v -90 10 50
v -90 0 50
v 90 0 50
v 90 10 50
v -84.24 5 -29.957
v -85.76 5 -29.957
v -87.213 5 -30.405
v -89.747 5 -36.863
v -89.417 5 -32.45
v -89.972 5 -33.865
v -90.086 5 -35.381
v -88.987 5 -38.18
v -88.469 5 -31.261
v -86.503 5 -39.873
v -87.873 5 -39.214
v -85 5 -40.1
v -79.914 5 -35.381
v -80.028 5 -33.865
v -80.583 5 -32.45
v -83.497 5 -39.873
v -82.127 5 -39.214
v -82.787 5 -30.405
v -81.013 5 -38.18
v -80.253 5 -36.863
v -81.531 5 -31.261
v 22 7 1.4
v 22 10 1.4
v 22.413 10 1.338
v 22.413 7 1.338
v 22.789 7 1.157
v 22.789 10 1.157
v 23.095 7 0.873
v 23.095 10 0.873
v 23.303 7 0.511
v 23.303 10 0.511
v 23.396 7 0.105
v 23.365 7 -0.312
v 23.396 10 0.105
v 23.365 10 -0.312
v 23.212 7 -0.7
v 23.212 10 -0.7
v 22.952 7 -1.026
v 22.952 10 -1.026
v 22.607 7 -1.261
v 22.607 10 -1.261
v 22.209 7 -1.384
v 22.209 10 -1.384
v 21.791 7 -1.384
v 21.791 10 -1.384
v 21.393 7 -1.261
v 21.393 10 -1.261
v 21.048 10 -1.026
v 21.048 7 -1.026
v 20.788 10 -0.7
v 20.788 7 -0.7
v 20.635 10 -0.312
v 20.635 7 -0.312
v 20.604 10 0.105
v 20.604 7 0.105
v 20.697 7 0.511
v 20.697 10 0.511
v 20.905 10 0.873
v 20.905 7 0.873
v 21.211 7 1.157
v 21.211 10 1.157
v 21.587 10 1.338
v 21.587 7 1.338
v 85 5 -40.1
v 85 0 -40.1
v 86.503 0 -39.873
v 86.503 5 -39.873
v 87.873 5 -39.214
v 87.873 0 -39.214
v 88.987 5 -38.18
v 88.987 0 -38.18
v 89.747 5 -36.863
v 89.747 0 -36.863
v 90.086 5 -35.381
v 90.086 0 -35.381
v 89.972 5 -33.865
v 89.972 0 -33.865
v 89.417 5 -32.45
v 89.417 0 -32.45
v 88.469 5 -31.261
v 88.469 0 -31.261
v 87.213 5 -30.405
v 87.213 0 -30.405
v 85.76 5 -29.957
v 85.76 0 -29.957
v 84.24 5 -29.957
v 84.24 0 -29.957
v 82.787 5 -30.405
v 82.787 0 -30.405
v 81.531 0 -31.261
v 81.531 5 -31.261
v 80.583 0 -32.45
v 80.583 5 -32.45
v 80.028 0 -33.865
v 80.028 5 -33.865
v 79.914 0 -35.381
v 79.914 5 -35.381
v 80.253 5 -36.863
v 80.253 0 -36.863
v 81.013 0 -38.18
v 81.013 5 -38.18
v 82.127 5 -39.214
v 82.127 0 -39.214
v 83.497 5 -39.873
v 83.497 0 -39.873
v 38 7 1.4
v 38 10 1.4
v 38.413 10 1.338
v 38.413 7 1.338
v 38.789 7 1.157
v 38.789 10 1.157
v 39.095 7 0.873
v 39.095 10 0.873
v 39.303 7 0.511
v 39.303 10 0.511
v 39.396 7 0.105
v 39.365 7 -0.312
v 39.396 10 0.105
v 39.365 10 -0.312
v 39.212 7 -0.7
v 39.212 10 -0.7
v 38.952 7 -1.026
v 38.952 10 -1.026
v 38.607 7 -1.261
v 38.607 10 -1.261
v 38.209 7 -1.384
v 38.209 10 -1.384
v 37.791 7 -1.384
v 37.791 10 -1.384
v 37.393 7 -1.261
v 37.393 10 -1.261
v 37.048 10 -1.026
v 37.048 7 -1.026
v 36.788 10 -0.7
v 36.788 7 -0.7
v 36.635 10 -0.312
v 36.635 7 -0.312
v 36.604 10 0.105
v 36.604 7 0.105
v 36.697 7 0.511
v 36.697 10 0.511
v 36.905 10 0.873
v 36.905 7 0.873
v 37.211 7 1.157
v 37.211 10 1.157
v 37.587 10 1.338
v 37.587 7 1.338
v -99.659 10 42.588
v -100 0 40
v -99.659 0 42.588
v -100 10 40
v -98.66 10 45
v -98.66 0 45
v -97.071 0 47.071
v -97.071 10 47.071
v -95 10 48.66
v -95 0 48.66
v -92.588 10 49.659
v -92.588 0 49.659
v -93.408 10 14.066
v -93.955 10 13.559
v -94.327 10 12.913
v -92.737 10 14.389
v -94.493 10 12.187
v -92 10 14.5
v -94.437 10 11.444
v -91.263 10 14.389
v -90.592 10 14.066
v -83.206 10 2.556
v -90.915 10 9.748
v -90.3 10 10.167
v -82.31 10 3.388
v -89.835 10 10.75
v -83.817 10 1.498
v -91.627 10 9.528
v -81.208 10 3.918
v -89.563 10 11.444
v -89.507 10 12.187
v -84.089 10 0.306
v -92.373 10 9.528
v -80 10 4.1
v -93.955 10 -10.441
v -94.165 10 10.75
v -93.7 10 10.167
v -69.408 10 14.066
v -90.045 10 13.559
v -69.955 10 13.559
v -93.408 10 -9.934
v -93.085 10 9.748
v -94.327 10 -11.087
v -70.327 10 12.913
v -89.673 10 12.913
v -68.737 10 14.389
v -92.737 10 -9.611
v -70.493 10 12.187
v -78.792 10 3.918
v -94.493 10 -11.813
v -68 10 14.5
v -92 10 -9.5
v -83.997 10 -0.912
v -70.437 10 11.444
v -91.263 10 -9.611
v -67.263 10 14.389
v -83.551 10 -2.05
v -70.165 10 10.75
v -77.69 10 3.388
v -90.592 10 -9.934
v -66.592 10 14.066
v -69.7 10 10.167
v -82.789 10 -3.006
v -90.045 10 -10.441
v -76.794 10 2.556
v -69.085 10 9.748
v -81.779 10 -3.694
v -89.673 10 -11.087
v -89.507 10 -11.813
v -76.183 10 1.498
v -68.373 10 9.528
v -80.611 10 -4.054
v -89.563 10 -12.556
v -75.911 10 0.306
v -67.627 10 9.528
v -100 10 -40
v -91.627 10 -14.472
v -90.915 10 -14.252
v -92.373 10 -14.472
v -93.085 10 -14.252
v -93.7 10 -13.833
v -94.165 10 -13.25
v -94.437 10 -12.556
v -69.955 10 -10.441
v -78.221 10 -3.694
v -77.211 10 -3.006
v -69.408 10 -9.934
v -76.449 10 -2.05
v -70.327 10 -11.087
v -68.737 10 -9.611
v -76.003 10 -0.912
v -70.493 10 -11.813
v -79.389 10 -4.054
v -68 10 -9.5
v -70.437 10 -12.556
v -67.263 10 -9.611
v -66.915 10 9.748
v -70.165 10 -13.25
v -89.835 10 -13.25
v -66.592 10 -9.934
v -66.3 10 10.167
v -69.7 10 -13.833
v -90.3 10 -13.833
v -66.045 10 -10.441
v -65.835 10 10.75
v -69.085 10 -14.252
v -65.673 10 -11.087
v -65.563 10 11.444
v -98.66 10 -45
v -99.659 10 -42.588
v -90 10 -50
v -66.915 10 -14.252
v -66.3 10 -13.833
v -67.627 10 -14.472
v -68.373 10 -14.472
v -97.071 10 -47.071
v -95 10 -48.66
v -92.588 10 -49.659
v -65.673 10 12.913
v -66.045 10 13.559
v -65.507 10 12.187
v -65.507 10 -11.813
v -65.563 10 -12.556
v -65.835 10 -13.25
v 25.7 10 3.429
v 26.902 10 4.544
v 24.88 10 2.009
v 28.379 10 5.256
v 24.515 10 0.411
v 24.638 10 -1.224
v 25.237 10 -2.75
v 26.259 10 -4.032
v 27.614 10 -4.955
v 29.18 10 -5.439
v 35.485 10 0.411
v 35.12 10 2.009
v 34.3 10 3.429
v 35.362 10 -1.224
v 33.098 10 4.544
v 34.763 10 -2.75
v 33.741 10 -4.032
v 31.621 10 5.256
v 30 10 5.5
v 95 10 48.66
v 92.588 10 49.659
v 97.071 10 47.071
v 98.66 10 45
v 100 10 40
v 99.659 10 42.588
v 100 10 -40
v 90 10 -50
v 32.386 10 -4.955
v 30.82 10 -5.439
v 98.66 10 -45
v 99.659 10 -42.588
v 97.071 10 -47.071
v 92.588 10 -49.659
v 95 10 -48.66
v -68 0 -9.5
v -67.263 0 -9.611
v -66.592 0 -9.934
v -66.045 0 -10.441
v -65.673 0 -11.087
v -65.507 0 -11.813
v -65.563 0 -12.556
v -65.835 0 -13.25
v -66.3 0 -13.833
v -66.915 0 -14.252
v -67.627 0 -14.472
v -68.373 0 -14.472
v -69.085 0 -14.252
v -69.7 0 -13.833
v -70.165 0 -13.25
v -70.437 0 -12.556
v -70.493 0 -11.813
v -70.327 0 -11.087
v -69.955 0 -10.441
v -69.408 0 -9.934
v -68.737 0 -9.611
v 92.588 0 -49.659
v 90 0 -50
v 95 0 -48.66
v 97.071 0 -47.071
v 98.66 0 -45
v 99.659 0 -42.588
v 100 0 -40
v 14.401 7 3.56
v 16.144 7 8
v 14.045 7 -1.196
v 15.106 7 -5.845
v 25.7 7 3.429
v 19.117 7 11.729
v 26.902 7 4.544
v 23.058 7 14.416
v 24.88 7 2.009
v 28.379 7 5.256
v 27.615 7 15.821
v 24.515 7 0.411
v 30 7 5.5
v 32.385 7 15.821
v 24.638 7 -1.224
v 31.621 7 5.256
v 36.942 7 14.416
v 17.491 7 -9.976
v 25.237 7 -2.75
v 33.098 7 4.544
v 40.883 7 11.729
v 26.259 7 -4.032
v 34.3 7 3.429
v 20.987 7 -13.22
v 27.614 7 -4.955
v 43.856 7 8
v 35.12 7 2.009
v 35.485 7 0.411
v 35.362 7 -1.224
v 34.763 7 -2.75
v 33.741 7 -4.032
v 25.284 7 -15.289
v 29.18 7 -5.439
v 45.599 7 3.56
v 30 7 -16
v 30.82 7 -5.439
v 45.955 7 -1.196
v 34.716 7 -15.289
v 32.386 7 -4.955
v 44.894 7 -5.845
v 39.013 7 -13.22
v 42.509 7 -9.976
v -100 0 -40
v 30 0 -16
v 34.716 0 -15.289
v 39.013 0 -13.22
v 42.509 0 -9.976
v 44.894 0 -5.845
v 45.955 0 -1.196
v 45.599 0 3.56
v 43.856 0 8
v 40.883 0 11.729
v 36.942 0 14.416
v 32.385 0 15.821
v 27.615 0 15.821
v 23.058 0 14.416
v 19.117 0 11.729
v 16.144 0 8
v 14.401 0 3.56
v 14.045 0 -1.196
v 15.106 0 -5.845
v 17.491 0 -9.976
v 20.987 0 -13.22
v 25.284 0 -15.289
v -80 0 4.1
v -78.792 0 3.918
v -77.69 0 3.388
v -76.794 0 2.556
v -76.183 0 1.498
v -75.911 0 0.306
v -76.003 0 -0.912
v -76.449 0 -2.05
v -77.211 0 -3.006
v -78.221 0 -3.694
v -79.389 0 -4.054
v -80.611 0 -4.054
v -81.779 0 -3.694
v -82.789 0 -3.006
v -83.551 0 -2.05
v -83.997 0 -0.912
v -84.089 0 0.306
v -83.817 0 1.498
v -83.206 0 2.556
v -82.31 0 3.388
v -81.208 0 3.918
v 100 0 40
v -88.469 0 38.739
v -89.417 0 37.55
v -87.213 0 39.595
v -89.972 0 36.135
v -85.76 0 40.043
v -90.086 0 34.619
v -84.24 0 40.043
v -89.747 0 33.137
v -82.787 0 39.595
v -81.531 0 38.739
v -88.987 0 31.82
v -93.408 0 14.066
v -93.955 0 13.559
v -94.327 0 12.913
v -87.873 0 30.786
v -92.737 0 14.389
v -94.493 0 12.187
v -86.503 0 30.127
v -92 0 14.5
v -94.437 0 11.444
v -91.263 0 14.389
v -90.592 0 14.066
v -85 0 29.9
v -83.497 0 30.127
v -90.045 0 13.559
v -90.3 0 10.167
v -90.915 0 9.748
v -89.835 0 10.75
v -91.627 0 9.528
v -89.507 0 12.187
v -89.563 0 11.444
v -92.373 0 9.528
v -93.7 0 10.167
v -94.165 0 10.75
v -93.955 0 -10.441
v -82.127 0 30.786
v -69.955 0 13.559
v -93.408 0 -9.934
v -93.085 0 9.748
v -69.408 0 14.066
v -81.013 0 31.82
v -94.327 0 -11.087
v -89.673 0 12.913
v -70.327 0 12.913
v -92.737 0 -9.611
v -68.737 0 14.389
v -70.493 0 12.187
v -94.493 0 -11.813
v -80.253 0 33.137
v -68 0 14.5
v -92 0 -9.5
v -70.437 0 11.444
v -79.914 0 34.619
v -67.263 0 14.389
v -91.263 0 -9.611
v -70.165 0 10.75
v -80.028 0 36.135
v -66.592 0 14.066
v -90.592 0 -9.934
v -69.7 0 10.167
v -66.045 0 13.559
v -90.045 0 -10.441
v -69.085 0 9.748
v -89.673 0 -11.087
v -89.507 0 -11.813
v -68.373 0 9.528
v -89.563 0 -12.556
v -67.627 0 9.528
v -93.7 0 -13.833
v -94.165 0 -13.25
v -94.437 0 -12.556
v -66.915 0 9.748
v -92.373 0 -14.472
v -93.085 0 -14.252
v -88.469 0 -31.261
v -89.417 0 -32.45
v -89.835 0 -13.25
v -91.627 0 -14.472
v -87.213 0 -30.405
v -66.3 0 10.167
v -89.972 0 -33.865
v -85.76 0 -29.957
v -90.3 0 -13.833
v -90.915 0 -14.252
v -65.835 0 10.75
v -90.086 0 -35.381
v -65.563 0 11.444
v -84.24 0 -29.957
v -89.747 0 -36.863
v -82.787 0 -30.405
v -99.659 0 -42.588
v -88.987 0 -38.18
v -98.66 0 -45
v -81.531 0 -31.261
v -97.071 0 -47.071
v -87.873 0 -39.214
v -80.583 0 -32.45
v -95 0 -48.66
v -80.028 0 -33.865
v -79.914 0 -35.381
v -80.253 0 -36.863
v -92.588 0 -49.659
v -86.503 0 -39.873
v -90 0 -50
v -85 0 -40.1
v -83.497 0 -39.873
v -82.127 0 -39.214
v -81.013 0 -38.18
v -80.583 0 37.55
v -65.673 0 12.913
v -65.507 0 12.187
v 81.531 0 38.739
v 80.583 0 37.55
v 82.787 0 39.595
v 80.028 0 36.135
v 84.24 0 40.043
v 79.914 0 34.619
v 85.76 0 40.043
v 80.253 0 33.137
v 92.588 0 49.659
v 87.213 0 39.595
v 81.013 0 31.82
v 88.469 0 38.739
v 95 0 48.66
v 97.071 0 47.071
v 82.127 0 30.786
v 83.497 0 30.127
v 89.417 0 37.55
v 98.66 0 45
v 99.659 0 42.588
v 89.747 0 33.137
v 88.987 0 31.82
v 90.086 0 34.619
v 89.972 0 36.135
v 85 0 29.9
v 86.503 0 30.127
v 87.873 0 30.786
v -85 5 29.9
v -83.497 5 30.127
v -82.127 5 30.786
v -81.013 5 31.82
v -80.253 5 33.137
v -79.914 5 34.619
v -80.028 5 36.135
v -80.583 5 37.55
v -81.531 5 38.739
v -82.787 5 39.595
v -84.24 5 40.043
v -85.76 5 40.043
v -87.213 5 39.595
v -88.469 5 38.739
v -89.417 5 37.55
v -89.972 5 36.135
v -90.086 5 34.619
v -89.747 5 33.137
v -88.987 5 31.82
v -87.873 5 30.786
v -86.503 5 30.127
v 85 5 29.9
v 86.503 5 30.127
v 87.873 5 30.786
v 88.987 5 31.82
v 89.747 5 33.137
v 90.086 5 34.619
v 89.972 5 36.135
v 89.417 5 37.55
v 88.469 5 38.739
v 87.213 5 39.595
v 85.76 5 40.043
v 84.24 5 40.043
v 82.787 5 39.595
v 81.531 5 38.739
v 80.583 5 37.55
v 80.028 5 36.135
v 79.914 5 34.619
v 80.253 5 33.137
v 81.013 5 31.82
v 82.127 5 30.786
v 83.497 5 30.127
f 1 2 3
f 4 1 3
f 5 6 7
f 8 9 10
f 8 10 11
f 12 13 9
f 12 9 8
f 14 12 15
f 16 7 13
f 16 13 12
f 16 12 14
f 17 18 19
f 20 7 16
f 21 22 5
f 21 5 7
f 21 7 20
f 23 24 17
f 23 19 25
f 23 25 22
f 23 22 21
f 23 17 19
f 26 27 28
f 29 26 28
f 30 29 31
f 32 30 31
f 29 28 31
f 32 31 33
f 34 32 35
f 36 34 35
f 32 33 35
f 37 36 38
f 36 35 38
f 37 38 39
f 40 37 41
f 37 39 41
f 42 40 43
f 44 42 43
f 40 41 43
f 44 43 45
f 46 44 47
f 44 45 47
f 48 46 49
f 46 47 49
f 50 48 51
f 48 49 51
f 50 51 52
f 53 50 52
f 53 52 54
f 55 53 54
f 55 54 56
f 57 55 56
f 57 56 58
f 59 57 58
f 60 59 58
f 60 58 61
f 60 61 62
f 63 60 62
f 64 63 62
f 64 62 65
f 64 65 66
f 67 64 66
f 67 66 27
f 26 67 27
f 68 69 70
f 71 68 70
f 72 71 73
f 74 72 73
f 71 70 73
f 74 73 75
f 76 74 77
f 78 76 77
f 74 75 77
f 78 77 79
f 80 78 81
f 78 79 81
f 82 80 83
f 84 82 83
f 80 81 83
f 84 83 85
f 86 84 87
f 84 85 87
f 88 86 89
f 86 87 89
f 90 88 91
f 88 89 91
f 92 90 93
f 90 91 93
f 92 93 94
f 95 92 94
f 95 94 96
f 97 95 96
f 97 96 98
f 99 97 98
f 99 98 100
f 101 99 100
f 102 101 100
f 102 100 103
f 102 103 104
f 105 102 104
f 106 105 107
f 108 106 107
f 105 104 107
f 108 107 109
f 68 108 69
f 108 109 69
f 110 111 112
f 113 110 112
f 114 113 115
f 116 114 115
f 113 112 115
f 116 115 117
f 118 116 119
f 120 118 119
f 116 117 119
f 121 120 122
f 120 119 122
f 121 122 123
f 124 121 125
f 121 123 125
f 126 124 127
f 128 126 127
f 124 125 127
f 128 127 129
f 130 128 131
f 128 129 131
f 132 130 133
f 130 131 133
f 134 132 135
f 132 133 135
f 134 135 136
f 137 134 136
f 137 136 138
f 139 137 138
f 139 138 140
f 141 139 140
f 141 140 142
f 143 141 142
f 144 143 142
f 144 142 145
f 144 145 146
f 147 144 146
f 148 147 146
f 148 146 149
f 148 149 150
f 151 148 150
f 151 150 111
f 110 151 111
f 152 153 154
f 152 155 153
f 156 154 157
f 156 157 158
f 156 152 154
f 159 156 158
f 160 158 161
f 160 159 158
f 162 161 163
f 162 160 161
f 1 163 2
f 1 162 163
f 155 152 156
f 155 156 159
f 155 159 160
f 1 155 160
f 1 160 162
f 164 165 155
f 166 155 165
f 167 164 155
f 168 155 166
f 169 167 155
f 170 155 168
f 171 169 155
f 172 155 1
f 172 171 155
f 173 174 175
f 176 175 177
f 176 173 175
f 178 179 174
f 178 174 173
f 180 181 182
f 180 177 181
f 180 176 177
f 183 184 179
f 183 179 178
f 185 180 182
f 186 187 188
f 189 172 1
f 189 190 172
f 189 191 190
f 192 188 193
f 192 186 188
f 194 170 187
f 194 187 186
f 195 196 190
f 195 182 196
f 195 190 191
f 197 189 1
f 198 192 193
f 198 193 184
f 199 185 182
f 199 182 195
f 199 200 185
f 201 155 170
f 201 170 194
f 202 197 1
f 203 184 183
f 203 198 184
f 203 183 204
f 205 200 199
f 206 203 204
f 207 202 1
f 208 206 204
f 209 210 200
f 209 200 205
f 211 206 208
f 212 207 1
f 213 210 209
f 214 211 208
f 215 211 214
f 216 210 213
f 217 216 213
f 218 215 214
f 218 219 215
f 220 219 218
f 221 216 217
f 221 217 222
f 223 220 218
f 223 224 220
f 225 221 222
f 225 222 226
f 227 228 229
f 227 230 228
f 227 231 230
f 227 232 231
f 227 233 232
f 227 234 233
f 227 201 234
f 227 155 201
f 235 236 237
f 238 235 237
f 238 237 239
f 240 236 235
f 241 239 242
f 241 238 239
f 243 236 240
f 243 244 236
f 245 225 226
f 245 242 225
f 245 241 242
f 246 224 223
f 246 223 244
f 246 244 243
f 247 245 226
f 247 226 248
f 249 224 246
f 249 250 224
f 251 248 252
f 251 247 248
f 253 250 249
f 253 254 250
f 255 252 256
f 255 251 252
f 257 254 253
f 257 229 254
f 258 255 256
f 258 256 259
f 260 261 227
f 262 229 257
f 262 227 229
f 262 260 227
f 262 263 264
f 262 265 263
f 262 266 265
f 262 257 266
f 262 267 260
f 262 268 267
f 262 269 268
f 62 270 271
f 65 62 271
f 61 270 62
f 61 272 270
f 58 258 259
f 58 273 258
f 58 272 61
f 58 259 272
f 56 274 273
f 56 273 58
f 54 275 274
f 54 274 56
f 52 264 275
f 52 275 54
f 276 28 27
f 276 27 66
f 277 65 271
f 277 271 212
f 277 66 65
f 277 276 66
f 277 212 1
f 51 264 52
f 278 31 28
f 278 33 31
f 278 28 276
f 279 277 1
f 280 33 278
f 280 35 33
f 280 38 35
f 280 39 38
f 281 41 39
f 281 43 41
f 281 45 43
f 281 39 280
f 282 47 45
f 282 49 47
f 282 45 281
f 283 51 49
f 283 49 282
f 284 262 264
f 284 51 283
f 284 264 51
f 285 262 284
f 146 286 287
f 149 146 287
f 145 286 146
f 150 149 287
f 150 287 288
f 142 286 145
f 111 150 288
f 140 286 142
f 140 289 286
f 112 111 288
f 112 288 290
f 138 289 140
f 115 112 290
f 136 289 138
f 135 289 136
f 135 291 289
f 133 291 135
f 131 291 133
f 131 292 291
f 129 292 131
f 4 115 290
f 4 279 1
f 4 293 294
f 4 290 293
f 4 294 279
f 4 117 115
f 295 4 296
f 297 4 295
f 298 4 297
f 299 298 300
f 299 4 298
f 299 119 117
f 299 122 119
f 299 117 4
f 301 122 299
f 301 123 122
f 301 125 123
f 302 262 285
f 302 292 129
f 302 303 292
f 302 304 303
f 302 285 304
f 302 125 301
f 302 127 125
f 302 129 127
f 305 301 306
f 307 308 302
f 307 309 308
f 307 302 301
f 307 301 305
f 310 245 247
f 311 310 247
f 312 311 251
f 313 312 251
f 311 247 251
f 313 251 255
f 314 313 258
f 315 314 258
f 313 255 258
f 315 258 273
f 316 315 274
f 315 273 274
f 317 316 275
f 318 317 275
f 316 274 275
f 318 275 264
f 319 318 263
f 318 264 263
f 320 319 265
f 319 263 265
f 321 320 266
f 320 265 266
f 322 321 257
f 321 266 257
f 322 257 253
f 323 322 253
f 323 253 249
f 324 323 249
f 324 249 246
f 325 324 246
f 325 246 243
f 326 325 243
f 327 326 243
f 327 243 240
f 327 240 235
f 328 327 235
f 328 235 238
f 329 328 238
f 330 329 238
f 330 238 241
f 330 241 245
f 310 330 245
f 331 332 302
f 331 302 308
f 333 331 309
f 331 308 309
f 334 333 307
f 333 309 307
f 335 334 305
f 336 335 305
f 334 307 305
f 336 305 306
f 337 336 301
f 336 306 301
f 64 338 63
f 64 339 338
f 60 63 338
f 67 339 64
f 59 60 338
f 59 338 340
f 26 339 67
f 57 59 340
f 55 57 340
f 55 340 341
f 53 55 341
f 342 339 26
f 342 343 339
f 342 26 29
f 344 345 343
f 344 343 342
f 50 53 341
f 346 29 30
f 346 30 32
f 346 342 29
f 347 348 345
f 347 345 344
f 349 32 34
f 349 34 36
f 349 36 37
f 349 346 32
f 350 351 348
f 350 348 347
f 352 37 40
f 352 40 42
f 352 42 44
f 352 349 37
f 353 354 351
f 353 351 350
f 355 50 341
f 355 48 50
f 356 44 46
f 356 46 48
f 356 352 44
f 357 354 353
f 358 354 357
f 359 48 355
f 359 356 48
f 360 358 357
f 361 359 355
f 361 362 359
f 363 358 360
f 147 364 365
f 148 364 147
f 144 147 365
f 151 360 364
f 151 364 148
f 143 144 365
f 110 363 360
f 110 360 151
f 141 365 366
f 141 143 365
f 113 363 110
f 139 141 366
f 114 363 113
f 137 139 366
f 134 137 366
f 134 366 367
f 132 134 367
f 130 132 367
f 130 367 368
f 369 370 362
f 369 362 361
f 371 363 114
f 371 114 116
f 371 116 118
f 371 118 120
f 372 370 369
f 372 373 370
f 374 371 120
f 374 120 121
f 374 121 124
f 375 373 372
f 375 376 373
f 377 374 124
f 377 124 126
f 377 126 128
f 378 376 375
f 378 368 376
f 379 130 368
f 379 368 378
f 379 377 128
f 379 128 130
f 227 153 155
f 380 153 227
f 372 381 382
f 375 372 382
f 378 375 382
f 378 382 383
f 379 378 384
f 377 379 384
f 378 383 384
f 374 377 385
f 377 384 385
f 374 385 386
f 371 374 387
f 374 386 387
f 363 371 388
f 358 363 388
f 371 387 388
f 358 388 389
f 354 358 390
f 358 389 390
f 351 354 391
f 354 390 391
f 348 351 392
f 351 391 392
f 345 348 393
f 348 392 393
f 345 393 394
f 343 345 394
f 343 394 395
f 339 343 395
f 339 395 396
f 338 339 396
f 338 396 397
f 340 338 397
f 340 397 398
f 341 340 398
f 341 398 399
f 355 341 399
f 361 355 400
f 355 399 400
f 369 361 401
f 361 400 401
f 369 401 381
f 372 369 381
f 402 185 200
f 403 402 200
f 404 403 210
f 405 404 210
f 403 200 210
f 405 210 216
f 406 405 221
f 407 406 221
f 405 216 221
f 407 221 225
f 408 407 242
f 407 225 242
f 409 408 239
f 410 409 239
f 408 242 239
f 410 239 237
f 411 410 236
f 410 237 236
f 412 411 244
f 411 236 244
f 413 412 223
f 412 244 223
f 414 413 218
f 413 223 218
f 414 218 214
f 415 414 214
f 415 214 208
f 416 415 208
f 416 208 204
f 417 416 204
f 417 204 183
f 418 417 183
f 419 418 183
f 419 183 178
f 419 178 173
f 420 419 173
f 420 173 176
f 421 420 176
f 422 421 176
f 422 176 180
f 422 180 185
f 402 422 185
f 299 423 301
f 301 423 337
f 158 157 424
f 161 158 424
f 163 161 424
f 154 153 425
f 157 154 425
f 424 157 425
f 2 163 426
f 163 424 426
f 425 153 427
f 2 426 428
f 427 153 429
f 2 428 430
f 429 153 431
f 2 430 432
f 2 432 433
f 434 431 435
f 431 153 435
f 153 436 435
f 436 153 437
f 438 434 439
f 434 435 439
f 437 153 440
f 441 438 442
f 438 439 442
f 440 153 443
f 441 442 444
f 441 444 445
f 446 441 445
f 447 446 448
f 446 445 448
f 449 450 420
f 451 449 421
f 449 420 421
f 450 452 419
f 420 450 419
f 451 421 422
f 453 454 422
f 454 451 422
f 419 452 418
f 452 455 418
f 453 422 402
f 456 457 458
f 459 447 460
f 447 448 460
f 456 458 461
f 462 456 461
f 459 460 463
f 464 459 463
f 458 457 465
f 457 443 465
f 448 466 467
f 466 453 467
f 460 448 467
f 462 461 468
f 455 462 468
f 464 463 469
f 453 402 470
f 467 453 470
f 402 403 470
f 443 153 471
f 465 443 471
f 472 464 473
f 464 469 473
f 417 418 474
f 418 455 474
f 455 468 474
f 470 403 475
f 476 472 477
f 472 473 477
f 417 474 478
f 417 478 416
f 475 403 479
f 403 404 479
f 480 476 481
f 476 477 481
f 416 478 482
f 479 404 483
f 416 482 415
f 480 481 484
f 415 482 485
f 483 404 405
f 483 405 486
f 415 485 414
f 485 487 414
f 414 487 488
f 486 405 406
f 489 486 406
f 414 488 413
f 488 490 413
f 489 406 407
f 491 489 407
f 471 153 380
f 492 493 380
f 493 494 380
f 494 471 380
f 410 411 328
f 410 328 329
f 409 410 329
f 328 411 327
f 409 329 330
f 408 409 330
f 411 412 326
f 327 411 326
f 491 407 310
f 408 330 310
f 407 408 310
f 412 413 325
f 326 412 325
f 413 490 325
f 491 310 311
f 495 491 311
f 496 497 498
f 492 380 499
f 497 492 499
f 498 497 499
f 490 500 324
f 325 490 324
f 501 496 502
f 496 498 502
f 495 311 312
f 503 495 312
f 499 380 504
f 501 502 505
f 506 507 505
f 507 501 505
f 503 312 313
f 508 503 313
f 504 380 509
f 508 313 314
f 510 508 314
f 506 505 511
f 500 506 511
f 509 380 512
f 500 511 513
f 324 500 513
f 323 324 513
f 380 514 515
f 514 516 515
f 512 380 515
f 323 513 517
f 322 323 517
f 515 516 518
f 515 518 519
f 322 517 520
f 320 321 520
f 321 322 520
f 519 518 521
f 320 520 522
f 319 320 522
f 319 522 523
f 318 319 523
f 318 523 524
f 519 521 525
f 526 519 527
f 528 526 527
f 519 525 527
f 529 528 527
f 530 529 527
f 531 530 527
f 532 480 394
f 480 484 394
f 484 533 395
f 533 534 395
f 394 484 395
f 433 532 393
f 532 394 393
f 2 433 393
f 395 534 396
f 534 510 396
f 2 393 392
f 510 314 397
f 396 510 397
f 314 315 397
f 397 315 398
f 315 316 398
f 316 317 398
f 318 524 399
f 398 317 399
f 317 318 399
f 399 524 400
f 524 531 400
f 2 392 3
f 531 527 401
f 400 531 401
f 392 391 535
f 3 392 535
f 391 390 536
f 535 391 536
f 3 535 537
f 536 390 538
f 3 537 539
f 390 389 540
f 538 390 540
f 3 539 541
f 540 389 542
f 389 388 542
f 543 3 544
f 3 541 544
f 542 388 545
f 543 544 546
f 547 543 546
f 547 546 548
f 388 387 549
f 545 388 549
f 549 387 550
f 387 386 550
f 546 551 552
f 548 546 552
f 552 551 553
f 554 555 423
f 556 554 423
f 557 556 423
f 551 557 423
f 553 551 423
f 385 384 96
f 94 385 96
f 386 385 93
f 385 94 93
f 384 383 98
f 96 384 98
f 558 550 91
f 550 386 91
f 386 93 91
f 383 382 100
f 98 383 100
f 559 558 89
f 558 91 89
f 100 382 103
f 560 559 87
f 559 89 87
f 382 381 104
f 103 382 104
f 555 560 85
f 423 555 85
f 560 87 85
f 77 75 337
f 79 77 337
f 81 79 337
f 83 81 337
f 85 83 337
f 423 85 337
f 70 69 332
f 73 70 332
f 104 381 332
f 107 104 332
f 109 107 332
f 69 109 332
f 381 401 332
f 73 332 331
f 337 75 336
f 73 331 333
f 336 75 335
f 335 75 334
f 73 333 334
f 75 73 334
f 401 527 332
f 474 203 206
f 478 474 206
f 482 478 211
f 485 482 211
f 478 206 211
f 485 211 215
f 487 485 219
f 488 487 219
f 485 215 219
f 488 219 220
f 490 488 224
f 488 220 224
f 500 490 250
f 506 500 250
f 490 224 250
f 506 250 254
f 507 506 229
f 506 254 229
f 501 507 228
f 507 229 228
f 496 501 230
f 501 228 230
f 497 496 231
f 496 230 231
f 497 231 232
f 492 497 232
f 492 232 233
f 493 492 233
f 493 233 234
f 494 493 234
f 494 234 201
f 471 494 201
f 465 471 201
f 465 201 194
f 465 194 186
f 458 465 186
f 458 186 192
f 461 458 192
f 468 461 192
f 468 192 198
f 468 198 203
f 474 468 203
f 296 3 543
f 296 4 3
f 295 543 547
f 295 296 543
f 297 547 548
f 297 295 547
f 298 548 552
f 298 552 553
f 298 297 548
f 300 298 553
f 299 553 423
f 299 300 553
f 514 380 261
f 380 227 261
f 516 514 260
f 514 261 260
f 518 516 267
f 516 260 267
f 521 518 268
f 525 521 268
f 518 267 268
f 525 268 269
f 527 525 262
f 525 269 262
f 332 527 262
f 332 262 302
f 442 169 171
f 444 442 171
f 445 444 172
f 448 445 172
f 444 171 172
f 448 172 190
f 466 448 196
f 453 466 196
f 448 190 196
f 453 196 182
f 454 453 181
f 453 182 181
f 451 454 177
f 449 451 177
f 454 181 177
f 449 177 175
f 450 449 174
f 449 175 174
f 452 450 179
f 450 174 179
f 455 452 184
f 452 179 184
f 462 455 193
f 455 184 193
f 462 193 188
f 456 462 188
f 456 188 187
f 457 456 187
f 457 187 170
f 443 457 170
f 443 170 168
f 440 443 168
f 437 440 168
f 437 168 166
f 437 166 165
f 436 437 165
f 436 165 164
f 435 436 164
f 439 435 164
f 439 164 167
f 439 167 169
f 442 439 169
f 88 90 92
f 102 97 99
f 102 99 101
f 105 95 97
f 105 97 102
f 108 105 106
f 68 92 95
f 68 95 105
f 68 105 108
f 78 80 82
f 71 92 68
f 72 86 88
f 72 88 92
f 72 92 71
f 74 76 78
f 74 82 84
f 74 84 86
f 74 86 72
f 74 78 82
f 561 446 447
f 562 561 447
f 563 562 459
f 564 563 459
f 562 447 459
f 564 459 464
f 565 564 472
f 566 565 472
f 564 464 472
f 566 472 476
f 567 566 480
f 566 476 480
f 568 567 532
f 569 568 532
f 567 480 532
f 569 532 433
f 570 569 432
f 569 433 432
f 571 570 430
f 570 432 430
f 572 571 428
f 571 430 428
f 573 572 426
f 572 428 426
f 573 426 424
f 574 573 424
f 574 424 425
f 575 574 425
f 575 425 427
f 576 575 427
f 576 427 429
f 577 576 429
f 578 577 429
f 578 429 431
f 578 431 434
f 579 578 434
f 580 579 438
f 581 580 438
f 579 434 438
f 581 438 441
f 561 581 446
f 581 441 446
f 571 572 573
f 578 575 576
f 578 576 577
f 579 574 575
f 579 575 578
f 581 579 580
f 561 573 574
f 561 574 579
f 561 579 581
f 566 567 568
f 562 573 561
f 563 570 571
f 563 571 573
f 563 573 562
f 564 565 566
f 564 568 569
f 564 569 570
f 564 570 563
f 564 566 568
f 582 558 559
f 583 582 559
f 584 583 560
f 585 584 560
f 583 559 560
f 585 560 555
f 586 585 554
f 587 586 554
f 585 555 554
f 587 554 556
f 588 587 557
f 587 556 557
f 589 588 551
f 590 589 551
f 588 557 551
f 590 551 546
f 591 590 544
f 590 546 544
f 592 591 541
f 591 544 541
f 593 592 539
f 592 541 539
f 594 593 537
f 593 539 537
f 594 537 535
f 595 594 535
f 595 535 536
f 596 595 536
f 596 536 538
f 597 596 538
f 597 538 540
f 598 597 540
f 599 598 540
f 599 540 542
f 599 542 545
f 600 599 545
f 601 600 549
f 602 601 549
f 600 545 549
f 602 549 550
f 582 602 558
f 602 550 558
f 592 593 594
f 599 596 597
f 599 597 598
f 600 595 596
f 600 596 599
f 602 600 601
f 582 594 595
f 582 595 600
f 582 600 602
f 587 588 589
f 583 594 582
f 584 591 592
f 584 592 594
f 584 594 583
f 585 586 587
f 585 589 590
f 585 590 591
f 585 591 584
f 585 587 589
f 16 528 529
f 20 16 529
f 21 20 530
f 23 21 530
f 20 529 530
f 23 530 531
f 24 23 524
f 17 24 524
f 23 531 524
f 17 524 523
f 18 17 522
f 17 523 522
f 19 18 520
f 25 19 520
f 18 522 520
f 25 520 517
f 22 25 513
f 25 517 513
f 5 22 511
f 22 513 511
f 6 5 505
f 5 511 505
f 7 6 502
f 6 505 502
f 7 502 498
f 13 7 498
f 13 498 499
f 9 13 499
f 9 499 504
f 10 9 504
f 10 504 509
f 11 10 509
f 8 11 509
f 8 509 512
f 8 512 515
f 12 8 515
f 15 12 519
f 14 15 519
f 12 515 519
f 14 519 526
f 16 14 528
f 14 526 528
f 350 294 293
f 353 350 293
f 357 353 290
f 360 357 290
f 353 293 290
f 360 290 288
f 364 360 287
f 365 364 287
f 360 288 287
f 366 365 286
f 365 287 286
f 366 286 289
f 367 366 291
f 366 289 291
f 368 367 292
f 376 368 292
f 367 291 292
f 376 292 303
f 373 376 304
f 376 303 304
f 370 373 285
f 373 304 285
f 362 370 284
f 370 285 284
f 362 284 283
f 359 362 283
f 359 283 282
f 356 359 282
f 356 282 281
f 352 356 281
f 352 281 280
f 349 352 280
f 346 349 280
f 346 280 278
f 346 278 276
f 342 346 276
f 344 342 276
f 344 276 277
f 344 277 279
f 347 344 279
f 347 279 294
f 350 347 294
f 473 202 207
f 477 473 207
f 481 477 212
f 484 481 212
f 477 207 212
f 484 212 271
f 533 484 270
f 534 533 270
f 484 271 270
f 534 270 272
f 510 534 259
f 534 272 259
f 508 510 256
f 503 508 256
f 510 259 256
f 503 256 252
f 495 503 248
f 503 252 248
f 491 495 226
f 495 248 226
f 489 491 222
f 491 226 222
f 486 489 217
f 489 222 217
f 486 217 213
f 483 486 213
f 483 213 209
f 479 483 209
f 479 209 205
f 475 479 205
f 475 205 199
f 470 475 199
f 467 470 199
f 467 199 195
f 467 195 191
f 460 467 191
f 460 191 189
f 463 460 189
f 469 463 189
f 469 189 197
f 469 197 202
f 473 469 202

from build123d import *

# Parameters (mm, degrees)
SKETCH_1_W          = 200
SKETCH_1_H          = 100
EXTRUDE_1_DEPTH     = 10
SKETCH_2_R          = 2.5
SKETCH_2_R_2        = 5.5
SKETCH_2_R_3        = 1.4
SKETCH_2_R_4        = 4.1
CUT_EXTRUDE_1_DEPTH = 113.249721603
SKETCH_3_R          = 16
CUT_EXTRUDE_2_DEPTH = 7
FILLET_1_R          = 10
SKETCH_4_R          = 5.1
CUT_EXTRUDE_4_DEPTH = 5


with BuildPart() as part:
    # ｽｹｯﾁ1 → ﾎﾞｽ - 押し出し1 (new body)
    with BuildSketch(Plane(origin=(0, 0, 0), x_dir=(1, 0, 0), z_dir=(0, 1, 0))):
        Rectangle(SKETCH_1_W, SKETCH_1_H)
    extrude(amount=EXTRUDE_1_DEPTH)

    # ｽｹｯﾁ2 → ｶｯﾄ - 押し出し1 (cut, through all)
    with BuildSketch(Plane(origin=(0, 10, 0), x_dir=(1, 0, 0), z_dir=(0, 1, 0))):
        with Locations(Location((-92, 12, 0), (0, 0, 270))):
            Circle(SKETCH_2_R)
        with Locations(Location((-68, 12, 0), (0, 0, 270))):
            Circle(SKETCH_2_R)
        with Locations(Location((-92, -12, 0), (0, 0, 270))):
            Circle(SKETCH_2_R)
        with Locations(Location((-68, -12, 0), (0, 0, 270))):
            Circle(SKETCH_2_R)
        with Locations(Location((30, 0, 0), (0, 0, 270))):
            Circle(SKETCH_2_R_2)
        with Locations(Location((38, 0, 0), (0, 0, 270))):
            Circle(SKETCH_2_R_3)
        with Locations(Location((22, 0, 0), (0, 0, 270))):
            Circle(SKETCH_2_R_3)
        with Locations(Location((-80, 0, 0), (0, 0, 270))):
            Circle(SKETCH_2_R_4)
    extrude(amount=-CUT_EXTRUDE_1_DEPTH, mode=Mode.SUBTRACT)

    # ｽｹｯﾁ3 → ｶｯﾄ - 押し出し2 (cut)
    with BuildSketch(Plane.XZ):
        with Locations(Location((30, 0, 0), (0, 0, 270))):
            Circle(SKETCH_3_R)
    extrude(amount=-CUT_EXTRUDE_2_DEPTH, mode=Mode.SUBTRACT)

    # ﾌｨﾚｯﾄ1
    fillet_1_edges = [part.edges().sort_by_distance(p)[0] for p in [
        (100, 5, 50),
        (-100, 5, 50),
        (-100, 5, -50),
        (100, 5, -50),
    ]]
    fillet(fillet_1_edges, radius=FILLET_1_R)

    # ｽｹｯﾁ4 → ｶｯﾄ - 押し出し4 (cut)
    with BuildSketch(Plane.XZ):
        with Locations(Location((-85, 35, 0), (0, 0, 270))):
            Circle(SKETCH_4_R)
        with Locations(Location((-85, -35, 0), (0, 0, 270))):
            Circle(SKETCH_4_R)
        with Locations(Location((85, -35, 0), (0, 0, 270))):
            Circle(SKETCH_4_R)
        with Locations(Location((85, 35, 0), (0, 0, 270))):
            Circle(SKETCH_4_R)
    extrude(amount=-CUT_EXTRUDE_4_DEPTH, mode=Mode.SUBTRACT)


solid = part.part
